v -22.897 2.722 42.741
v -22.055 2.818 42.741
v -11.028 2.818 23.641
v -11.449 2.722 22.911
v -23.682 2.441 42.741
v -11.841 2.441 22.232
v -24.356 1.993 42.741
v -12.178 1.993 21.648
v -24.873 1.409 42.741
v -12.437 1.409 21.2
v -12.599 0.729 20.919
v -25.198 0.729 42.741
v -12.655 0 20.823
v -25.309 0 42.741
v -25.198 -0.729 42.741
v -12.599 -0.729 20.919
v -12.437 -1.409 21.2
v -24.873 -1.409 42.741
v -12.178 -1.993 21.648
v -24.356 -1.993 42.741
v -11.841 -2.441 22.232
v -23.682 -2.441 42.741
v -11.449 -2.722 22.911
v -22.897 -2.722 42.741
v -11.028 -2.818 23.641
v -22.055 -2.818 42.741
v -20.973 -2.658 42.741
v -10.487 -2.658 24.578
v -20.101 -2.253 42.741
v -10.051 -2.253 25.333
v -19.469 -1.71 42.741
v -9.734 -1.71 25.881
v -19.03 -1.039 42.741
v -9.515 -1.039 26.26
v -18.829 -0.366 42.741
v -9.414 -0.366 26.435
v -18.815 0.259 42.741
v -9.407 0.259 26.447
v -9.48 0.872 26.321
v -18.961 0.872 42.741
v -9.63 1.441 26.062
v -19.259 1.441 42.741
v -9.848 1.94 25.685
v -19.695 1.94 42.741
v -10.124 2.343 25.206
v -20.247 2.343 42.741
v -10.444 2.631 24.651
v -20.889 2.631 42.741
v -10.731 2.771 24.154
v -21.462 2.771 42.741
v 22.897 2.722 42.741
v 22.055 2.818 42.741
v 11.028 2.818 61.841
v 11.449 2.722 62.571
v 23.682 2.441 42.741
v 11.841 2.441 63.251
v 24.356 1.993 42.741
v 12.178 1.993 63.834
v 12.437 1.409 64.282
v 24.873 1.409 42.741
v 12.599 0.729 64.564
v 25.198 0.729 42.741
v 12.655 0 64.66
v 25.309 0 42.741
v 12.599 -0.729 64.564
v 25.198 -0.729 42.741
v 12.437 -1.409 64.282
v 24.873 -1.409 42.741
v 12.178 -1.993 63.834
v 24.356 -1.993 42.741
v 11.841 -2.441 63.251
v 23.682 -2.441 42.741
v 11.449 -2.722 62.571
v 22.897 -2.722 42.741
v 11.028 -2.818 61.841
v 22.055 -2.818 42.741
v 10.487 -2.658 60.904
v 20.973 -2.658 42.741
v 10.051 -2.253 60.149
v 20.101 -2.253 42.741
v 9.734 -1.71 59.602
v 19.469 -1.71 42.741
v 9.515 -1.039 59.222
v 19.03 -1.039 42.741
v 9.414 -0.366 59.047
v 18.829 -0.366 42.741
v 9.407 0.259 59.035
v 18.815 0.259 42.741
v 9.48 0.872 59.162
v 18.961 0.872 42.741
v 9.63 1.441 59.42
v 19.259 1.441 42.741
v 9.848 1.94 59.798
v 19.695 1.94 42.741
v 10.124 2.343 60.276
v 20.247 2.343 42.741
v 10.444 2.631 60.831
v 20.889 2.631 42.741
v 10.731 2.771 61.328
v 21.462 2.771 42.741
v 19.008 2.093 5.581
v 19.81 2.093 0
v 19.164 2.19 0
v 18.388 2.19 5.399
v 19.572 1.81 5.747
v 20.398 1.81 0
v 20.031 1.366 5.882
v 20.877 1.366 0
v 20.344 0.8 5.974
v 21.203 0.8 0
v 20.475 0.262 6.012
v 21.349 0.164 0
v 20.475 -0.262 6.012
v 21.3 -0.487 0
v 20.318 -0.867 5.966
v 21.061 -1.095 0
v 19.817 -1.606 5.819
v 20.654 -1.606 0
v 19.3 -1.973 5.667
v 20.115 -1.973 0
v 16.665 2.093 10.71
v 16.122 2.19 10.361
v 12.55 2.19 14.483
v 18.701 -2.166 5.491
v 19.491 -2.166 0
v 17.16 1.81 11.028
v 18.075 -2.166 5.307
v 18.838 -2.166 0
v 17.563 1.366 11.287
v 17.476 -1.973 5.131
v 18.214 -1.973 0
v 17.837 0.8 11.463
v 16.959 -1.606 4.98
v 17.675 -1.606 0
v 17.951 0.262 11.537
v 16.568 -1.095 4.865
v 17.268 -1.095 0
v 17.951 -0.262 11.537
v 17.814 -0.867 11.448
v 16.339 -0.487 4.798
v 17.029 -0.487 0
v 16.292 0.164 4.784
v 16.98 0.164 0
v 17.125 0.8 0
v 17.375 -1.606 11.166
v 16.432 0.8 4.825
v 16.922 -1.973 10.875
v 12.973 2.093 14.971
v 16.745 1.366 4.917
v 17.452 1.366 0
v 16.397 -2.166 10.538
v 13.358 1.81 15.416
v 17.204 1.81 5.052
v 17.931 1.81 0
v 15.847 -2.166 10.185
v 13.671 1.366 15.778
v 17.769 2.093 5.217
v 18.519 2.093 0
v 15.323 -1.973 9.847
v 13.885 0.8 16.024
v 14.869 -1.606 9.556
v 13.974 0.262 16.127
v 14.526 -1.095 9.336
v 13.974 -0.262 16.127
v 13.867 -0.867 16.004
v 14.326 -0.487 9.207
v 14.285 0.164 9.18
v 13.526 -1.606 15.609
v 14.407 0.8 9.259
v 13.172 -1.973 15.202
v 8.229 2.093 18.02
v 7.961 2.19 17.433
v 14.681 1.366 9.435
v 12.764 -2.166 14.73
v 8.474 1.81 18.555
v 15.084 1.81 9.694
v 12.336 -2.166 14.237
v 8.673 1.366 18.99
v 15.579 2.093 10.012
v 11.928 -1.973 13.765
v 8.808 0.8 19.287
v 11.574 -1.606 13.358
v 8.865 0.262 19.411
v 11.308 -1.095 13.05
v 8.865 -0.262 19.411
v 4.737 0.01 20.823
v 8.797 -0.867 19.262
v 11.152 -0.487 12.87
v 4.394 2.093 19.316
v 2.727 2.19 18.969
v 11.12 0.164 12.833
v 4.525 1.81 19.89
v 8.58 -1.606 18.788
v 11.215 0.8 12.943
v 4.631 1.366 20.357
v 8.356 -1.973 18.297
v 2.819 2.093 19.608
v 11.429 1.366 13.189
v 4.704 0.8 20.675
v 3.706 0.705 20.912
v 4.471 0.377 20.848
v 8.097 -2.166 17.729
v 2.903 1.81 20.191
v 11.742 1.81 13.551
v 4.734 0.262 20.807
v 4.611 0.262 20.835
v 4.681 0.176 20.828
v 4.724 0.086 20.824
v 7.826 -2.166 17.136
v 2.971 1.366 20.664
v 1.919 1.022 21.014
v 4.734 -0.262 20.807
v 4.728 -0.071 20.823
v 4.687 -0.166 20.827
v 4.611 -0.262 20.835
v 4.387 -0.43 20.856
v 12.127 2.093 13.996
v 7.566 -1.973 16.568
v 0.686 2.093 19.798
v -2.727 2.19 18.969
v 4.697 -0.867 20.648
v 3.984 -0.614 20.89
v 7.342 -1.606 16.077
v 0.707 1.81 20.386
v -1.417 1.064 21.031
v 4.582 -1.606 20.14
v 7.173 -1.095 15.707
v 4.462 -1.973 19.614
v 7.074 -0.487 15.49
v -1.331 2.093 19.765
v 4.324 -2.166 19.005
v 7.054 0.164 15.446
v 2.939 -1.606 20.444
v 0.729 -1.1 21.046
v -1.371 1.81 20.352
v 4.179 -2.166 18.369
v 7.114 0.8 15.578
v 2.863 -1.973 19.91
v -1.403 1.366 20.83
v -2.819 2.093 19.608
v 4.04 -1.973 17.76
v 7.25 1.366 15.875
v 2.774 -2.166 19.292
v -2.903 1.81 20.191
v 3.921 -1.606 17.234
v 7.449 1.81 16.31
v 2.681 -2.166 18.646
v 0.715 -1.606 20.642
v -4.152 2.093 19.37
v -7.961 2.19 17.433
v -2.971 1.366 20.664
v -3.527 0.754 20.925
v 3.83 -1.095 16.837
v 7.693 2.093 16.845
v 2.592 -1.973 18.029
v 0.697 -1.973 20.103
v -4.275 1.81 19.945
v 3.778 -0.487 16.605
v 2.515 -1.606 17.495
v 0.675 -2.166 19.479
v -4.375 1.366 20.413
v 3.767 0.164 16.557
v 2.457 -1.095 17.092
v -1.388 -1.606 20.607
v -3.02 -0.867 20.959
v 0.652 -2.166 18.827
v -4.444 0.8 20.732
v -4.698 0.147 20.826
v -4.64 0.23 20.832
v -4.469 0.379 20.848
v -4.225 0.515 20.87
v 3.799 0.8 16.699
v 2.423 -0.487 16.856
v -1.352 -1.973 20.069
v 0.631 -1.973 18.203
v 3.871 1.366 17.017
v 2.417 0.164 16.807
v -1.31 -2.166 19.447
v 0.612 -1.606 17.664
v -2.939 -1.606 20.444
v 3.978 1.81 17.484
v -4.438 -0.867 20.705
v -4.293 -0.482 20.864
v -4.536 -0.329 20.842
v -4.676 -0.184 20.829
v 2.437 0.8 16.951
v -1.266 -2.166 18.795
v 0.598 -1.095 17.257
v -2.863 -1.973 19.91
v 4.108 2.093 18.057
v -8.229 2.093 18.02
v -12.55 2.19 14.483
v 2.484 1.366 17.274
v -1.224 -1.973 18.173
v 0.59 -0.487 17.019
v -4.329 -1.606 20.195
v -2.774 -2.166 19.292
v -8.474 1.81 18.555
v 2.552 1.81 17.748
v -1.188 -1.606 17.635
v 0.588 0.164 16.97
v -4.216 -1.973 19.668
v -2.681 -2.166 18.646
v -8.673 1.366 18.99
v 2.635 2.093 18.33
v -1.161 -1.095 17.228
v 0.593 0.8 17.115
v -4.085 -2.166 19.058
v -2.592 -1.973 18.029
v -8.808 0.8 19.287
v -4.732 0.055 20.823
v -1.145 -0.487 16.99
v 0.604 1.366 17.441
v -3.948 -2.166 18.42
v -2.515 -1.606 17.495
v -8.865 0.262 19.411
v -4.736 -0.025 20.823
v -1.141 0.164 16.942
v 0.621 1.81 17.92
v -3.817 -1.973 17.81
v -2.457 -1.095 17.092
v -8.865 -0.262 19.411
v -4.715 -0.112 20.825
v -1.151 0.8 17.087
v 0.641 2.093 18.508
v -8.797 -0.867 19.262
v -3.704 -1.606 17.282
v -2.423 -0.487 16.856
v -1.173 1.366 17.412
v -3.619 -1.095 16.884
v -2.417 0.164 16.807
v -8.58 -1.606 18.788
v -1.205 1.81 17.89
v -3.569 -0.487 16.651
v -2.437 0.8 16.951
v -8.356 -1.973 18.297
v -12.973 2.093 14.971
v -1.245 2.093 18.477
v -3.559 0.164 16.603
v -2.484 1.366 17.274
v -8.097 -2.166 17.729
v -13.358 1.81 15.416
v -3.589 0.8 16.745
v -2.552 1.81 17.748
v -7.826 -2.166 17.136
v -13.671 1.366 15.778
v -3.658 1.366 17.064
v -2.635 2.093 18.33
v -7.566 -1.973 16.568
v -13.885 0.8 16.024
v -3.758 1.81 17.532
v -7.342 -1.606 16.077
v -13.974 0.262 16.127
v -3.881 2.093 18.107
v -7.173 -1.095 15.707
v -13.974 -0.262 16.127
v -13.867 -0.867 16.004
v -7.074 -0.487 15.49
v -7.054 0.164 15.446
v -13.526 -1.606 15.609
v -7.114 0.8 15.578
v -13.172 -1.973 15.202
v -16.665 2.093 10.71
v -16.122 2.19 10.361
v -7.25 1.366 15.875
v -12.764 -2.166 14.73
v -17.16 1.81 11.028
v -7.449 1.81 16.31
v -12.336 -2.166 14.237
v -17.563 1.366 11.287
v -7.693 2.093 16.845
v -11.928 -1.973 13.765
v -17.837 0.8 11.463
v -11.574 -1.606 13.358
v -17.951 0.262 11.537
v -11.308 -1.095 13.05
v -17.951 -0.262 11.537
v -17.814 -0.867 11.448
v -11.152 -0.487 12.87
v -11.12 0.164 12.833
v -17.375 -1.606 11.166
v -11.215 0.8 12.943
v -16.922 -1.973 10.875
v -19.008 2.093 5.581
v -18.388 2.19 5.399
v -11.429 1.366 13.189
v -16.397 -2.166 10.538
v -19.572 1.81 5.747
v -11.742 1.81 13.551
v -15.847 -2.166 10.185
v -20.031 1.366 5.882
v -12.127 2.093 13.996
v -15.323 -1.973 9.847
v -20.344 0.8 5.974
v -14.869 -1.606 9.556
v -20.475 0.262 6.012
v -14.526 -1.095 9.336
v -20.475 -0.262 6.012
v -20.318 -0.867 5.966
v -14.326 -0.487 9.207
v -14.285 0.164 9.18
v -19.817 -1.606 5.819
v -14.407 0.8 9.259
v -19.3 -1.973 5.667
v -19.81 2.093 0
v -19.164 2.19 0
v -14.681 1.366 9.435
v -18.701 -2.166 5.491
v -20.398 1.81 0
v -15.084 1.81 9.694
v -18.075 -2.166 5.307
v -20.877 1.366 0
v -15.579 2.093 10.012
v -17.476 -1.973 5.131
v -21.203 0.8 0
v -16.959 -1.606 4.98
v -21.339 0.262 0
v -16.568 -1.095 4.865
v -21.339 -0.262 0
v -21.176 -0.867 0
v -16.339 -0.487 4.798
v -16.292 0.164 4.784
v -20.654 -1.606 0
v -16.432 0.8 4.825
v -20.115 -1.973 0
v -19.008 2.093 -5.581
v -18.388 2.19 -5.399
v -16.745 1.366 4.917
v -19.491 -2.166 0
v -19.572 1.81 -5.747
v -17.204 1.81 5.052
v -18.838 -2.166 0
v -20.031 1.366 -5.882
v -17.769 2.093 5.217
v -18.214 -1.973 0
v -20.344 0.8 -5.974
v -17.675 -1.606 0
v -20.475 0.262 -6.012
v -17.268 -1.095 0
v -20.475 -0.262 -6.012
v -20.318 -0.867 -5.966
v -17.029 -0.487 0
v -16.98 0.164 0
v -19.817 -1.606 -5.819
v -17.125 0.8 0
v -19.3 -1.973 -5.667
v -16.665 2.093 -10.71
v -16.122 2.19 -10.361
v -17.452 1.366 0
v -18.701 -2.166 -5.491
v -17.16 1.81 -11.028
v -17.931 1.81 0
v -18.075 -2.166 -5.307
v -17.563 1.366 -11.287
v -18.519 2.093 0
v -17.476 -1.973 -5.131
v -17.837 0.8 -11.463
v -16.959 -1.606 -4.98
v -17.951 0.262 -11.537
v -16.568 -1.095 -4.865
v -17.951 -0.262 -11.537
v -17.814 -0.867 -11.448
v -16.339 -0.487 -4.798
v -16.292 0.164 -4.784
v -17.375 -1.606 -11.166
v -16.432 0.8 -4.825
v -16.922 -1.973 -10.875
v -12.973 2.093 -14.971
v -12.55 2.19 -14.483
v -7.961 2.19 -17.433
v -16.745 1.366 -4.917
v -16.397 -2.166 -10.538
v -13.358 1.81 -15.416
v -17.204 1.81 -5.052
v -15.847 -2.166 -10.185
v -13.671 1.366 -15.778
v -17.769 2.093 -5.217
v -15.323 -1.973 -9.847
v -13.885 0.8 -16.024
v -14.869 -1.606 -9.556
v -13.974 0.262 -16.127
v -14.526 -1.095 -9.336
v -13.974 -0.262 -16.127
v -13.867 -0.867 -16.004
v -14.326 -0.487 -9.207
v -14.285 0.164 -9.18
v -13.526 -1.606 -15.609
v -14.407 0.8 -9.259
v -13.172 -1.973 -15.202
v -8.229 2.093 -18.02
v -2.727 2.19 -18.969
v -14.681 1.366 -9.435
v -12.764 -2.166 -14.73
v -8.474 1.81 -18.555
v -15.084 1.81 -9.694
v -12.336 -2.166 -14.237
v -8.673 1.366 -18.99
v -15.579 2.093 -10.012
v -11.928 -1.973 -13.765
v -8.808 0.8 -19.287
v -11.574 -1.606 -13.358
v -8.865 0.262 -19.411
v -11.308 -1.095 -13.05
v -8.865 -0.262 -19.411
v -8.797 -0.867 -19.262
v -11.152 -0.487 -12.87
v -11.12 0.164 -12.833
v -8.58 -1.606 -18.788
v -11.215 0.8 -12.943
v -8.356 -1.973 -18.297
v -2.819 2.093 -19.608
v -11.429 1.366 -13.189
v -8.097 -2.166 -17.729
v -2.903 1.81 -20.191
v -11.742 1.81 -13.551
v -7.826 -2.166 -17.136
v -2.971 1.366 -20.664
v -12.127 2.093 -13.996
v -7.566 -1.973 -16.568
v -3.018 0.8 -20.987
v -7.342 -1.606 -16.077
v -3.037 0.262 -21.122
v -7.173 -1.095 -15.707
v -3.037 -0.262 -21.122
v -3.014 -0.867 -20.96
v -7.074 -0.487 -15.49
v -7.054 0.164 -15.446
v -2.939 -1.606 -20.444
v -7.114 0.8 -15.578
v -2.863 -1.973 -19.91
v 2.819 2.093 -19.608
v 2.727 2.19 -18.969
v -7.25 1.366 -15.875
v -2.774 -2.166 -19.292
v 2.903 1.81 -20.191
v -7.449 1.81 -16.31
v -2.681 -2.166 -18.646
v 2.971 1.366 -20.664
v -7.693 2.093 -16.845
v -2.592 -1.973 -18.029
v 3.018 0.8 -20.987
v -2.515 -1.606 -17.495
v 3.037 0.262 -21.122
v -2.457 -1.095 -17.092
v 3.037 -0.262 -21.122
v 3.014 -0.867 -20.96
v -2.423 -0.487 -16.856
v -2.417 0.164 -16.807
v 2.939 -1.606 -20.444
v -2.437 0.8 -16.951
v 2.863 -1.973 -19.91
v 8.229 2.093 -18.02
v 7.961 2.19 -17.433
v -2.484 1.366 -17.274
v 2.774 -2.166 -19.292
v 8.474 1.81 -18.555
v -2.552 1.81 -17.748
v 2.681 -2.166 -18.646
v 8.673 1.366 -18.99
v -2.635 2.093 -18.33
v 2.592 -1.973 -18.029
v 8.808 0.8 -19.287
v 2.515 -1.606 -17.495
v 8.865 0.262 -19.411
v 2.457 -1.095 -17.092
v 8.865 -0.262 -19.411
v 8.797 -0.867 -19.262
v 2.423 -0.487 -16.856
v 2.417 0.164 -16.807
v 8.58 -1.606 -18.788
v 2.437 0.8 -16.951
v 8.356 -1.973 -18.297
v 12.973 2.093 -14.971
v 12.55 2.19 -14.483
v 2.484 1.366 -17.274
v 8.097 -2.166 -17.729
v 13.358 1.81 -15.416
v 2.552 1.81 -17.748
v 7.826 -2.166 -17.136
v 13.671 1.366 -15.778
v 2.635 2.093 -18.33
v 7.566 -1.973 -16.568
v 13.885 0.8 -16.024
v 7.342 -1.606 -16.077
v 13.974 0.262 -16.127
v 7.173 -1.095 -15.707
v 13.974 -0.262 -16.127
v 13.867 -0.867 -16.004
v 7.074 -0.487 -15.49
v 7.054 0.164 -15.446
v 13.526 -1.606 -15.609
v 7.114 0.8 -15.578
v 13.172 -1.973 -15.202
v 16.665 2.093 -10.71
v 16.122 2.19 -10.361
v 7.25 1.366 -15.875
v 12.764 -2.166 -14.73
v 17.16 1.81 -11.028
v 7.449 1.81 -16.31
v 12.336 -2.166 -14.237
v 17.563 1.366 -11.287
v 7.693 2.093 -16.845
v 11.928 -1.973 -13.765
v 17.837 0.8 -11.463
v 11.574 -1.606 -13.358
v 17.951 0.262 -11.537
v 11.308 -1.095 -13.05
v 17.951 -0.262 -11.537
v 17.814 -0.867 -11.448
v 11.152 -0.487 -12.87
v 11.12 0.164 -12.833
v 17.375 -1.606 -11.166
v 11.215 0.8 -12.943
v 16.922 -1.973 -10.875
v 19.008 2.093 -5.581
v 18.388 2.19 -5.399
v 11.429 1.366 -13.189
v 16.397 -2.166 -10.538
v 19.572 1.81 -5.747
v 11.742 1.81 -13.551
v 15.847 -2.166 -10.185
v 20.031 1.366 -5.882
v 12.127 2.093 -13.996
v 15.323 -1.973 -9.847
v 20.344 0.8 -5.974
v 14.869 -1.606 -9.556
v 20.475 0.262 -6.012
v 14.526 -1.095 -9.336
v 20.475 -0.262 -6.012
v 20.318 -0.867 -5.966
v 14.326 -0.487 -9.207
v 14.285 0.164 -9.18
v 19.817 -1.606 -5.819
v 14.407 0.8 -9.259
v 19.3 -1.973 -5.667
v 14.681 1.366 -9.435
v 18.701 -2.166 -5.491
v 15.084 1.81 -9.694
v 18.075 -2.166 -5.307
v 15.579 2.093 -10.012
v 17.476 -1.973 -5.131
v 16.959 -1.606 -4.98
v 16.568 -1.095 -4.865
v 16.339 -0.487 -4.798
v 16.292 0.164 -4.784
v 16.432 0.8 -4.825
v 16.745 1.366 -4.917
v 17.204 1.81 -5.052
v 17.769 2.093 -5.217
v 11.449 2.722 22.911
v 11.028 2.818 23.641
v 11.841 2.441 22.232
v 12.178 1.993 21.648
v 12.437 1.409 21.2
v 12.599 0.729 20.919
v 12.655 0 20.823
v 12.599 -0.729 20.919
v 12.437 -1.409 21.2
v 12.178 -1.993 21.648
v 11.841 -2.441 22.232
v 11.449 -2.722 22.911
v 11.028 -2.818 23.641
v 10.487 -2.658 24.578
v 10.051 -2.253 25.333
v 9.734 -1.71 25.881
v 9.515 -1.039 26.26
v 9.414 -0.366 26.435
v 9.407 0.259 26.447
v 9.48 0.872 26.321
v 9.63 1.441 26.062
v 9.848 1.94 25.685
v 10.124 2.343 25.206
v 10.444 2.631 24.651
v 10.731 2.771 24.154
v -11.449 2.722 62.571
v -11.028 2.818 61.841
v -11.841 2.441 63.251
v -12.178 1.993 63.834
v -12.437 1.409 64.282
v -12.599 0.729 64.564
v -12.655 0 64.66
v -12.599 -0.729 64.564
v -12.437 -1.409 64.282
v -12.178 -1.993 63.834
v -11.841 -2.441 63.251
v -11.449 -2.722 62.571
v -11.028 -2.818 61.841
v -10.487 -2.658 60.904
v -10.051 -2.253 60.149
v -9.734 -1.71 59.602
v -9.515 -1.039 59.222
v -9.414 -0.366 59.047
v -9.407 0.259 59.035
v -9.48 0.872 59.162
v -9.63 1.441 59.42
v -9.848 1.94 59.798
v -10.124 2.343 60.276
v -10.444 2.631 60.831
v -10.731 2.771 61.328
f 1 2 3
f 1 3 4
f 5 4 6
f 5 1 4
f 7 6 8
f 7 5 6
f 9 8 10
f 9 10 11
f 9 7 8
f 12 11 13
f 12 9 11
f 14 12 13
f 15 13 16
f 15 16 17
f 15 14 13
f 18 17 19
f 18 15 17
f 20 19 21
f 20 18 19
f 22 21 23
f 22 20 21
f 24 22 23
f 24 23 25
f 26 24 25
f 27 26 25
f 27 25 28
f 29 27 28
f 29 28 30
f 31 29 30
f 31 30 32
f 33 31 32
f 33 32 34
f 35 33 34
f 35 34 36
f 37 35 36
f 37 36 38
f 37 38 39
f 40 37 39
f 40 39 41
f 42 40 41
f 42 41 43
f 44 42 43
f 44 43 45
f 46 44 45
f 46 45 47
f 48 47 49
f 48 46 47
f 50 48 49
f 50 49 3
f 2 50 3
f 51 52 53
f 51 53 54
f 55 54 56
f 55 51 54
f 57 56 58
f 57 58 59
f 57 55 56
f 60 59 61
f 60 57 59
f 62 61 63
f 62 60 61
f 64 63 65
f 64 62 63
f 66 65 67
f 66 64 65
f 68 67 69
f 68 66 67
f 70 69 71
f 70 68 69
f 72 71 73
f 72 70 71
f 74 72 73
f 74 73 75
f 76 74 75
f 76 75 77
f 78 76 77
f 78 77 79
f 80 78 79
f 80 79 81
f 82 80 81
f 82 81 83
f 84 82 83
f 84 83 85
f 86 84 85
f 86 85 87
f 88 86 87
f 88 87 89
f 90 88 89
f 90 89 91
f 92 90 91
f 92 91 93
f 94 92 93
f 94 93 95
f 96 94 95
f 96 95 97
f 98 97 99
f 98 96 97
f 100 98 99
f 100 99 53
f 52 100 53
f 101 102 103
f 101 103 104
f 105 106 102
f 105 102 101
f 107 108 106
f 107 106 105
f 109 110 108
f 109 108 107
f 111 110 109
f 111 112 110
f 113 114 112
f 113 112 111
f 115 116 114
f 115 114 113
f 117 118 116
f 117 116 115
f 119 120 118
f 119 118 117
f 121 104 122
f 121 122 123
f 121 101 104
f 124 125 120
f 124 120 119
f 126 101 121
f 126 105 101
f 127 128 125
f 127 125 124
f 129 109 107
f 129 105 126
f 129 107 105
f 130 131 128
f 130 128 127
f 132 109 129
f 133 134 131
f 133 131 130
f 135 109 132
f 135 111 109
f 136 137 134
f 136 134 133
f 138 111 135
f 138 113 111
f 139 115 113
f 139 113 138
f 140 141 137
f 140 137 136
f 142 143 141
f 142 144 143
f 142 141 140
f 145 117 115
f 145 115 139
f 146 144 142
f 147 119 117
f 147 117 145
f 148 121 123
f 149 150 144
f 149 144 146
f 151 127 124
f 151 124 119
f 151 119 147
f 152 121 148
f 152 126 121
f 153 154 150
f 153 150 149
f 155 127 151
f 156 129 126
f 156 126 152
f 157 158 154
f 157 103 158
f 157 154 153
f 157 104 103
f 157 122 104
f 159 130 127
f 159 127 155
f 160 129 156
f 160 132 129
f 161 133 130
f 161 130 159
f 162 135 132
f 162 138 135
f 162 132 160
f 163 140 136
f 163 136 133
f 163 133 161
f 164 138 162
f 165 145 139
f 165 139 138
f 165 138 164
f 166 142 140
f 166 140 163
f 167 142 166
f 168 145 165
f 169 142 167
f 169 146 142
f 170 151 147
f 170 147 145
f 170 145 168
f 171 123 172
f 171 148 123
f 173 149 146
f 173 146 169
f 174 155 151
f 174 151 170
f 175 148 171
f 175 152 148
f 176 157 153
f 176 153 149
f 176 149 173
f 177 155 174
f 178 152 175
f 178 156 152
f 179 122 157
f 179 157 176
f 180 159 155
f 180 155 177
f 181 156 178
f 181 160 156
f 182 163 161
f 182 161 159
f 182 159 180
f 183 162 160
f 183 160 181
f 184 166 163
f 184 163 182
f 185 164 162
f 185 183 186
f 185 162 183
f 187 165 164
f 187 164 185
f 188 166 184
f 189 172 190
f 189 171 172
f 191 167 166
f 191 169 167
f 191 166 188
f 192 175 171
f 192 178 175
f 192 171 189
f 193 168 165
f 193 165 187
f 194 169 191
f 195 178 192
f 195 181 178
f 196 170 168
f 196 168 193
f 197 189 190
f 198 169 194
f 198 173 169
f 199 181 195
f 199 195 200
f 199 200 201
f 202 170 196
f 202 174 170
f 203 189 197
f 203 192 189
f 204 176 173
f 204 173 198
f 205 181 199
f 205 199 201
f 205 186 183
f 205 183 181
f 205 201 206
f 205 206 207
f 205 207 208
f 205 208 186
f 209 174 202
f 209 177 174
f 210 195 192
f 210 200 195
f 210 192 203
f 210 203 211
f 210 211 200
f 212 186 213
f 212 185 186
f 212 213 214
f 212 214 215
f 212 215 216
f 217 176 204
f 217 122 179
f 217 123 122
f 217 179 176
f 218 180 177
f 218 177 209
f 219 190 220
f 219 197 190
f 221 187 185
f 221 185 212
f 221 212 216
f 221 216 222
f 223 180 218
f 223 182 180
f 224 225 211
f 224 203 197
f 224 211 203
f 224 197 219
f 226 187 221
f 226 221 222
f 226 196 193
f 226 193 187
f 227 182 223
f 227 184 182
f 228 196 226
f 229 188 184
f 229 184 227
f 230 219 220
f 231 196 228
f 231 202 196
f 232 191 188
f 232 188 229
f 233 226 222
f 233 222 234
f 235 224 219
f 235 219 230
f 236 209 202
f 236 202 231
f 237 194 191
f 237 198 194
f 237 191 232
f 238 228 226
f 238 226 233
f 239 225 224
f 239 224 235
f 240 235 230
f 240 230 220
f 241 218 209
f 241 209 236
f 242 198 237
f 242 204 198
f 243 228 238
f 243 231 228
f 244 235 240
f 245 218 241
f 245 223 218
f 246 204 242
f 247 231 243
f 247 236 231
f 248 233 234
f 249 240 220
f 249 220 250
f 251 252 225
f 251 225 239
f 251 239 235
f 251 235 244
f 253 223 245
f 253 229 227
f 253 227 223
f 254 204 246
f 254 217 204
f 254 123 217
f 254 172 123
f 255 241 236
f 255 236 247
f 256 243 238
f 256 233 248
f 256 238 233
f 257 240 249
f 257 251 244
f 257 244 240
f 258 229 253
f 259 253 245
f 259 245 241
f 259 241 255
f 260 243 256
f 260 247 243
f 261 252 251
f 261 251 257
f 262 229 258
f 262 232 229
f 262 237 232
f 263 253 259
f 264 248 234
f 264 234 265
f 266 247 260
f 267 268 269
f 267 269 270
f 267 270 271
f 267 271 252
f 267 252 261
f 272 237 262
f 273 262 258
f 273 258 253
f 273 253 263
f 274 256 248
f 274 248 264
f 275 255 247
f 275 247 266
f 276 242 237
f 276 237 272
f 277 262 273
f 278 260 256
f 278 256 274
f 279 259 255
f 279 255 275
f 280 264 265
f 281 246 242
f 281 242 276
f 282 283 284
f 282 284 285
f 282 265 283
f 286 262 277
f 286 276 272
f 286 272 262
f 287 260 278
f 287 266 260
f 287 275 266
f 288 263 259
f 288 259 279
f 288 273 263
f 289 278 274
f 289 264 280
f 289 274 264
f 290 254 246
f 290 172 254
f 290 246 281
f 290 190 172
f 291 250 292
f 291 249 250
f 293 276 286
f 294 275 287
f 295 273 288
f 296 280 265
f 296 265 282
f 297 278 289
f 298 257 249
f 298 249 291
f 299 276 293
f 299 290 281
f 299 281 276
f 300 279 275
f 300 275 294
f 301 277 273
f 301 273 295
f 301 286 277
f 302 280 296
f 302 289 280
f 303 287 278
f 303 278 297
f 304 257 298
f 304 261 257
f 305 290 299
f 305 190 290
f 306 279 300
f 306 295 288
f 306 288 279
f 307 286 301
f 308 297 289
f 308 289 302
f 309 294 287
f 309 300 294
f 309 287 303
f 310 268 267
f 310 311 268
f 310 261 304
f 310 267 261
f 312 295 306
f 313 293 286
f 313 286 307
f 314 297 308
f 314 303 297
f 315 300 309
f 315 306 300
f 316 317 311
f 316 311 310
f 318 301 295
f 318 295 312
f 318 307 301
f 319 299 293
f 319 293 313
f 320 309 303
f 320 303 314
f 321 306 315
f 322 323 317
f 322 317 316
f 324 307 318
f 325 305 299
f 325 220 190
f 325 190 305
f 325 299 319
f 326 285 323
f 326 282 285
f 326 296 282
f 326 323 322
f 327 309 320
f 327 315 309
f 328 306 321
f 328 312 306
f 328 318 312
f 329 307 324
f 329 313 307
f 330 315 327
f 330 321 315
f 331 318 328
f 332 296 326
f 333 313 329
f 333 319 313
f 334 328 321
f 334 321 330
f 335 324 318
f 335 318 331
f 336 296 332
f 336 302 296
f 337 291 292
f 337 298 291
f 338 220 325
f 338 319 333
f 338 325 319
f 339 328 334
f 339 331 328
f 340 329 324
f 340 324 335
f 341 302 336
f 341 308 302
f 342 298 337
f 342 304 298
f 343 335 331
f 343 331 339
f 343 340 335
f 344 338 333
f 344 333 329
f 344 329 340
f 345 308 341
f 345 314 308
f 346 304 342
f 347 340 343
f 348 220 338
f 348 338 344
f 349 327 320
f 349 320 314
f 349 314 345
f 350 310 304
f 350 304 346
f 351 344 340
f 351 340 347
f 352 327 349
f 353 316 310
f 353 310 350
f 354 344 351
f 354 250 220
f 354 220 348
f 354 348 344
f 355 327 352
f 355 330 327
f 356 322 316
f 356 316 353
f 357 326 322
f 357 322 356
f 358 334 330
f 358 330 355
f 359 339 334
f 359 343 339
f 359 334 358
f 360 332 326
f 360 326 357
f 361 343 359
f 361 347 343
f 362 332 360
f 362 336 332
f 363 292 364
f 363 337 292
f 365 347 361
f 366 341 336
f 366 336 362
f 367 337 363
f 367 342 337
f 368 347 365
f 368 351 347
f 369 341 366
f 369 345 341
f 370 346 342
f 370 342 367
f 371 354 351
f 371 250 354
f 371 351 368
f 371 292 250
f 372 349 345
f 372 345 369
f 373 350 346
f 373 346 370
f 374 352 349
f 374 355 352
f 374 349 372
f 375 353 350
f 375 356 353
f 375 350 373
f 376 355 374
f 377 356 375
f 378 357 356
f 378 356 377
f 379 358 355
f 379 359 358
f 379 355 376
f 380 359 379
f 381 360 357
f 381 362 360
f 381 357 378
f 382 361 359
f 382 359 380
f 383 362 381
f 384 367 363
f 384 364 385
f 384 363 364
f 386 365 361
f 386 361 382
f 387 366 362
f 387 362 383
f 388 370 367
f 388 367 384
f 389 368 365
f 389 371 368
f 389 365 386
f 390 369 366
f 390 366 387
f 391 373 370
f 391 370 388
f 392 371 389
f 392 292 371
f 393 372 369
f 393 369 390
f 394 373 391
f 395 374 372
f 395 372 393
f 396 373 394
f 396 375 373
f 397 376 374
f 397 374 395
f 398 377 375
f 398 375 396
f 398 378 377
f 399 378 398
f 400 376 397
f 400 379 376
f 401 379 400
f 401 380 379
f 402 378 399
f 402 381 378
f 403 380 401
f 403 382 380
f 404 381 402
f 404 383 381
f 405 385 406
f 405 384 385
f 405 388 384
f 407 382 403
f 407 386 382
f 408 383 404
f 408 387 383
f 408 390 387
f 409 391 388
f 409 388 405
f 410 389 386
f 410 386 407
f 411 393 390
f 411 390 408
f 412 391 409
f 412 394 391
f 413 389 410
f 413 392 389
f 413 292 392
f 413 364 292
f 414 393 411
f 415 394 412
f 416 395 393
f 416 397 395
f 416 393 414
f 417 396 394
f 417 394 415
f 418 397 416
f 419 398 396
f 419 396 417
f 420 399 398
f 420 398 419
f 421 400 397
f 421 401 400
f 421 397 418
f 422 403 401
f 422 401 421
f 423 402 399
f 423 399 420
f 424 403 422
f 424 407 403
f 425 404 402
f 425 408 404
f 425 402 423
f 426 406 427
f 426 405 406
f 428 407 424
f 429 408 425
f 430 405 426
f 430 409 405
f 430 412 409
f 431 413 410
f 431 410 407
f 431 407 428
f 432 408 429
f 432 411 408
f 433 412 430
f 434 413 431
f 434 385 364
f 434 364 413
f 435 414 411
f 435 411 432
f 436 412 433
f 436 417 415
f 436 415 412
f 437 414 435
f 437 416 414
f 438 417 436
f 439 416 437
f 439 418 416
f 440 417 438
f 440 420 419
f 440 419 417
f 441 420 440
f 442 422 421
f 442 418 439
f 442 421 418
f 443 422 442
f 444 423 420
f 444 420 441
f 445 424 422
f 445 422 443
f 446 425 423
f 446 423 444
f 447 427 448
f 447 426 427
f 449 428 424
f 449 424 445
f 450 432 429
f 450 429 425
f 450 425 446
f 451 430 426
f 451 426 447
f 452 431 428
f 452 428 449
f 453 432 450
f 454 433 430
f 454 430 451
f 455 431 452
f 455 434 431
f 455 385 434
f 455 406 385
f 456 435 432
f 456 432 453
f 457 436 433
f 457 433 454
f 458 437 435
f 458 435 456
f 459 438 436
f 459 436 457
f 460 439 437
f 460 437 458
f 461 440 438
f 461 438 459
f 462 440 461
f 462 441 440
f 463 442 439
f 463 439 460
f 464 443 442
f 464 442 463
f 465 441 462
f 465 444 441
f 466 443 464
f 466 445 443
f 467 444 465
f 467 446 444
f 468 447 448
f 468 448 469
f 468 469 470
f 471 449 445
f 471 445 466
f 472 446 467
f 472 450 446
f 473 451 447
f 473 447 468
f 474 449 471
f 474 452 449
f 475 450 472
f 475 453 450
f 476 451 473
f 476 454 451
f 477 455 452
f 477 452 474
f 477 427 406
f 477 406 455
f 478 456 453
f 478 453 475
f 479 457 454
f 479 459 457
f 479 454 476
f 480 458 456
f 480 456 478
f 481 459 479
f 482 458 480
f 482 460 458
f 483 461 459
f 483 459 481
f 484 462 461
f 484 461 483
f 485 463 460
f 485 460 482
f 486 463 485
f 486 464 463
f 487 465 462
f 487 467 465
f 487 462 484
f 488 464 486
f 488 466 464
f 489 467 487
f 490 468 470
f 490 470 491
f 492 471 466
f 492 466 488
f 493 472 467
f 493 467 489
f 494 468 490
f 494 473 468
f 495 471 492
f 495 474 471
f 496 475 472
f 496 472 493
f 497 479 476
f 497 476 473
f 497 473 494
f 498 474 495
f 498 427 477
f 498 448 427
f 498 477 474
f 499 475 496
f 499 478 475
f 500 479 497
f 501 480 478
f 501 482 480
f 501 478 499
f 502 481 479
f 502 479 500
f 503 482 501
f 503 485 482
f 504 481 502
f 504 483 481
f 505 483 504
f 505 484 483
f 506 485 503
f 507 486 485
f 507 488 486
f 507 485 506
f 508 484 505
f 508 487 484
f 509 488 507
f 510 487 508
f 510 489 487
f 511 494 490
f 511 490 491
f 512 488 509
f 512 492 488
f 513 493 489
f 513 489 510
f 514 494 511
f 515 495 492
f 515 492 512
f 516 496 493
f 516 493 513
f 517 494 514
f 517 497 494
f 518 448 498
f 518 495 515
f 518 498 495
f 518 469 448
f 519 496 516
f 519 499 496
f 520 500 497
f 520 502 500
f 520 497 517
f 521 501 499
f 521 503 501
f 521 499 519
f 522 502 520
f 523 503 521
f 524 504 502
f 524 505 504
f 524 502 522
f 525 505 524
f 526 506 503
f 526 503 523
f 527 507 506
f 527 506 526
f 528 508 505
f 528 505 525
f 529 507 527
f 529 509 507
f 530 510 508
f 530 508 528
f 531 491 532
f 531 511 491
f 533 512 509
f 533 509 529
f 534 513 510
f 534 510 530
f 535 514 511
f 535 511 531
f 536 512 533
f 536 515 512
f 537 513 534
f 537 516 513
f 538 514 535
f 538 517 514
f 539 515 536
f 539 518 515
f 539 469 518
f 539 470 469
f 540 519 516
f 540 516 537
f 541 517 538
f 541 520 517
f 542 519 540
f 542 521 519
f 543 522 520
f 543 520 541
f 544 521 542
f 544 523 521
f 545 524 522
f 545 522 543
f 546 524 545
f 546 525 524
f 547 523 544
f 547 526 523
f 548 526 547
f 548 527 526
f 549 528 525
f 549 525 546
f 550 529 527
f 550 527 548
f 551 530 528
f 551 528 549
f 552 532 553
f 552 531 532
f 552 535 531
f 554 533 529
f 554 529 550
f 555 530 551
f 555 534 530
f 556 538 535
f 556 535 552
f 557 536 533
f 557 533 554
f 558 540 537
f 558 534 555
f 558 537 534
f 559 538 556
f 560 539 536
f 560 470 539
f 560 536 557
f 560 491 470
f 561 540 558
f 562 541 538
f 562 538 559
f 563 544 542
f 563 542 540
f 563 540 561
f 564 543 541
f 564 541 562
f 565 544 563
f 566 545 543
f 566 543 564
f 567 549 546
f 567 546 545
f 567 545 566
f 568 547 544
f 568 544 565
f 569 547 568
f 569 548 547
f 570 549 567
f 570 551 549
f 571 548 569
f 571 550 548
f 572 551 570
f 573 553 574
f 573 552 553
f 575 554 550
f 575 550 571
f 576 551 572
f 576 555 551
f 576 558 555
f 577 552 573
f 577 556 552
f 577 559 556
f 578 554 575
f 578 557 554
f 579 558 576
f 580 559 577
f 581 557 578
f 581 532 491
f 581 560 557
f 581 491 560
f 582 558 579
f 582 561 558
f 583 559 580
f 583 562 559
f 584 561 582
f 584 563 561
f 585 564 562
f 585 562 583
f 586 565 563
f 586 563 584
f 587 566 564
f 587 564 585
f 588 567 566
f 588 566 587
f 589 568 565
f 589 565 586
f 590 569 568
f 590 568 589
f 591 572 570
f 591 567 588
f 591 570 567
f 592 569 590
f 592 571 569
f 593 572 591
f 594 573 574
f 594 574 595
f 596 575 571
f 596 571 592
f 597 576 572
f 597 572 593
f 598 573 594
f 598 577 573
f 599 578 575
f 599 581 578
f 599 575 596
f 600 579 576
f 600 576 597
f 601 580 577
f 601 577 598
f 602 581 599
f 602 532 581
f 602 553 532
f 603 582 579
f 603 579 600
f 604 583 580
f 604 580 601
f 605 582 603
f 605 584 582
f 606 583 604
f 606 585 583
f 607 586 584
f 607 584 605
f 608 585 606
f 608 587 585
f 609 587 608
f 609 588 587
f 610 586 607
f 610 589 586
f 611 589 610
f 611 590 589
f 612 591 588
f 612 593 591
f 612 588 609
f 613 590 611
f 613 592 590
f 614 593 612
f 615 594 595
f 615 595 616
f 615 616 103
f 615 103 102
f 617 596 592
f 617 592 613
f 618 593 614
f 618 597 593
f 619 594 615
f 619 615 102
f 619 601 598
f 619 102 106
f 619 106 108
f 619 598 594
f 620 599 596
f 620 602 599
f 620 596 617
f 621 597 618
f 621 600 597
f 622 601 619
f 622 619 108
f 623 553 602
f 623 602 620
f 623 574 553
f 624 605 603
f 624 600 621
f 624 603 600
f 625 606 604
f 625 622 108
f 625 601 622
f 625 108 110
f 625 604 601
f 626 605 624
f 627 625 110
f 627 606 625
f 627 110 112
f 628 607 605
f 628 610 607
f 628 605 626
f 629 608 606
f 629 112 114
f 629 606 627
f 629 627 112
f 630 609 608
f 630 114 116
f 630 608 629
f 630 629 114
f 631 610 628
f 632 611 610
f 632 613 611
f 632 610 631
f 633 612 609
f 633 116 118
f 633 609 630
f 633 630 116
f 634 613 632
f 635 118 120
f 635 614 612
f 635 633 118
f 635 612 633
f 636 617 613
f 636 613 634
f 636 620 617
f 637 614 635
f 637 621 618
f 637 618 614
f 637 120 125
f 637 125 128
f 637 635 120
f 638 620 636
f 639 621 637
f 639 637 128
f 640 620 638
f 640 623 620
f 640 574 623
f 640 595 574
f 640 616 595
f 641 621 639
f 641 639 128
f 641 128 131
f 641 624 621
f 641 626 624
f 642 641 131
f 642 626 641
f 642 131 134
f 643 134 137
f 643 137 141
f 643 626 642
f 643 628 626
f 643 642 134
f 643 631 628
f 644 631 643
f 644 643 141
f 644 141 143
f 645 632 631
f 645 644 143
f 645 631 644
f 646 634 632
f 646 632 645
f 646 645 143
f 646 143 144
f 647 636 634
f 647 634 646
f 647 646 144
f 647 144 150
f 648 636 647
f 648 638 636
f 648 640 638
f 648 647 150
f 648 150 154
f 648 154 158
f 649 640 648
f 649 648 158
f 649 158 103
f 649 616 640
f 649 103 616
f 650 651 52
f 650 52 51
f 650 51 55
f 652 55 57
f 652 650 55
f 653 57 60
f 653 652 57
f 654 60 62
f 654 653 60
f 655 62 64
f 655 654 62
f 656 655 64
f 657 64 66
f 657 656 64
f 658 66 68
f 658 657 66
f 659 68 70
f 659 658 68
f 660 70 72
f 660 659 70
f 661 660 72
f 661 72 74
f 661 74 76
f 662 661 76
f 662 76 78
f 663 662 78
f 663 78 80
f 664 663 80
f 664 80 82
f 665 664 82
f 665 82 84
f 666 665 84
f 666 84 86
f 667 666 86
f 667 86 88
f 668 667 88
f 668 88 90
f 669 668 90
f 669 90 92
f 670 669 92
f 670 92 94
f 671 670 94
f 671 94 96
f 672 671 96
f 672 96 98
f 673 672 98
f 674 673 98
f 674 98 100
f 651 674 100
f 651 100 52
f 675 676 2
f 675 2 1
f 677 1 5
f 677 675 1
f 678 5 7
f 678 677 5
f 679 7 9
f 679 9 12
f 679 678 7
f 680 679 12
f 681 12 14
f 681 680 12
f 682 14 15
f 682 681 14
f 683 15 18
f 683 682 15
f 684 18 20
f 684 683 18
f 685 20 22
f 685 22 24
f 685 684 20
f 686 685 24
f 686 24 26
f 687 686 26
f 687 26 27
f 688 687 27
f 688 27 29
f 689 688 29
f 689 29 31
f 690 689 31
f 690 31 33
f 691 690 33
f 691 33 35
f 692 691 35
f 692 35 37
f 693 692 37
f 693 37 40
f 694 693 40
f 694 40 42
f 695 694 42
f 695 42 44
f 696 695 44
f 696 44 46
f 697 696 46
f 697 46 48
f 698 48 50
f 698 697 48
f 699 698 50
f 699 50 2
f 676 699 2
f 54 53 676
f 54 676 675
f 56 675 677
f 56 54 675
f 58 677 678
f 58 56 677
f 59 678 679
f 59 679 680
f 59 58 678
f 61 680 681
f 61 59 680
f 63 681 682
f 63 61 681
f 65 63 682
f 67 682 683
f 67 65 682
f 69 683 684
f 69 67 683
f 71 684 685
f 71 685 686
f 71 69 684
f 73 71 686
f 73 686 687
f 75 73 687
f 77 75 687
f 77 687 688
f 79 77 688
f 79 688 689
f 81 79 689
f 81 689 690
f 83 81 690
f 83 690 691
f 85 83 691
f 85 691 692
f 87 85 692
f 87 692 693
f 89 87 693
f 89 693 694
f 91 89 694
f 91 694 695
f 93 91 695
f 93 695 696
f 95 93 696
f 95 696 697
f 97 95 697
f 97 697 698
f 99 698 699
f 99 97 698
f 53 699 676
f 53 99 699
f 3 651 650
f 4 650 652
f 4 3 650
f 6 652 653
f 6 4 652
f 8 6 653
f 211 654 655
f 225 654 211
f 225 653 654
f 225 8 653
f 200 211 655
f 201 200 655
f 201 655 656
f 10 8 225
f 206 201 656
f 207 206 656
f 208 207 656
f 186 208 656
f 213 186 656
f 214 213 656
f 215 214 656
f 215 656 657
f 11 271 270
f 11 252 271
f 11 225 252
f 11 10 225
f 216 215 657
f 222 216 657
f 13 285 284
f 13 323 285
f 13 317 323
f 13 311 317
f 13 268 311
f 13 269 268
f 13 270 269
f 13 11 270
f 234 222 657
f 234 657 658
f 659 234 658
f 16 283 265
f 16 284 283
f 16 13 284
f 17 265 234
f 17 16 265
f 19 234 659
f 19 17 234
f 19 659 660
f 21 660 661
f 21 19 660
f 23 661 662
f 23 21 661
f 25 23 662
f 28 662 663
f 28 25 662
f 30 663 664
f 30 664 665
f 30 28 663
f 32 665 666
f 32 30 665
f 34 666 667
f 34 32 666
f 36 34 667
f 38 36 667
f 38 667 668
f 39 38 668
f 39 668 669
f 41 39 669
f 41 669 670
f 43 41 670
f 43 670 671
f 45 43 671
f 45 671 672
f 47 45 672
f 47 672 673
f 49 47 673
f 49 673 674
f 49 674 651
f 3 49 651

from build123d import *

# Parameters (mm, degrees)
F1_R = 2.1902863251
F4_R = 2.8180913068


with BuildPart() as f2:
    # F2: sweep along a path in F0
    with BuildLine(Plane.XZ) as f2_path:
        CenterArc((0, 0), 19.2595042625, 0, 360)
    # F1 (on Right) → F2 (sweep)
    with BuildSketch(Plane.YZ):
        with Locations((0, 19.164359197)):
            Circle(F1_R)
    sweep(path=f2_path.line)

    # F5: sweep along a path in F3
    with BuildLine(Plane.XZ) as f5_path:
        Line((-8.6774716492, 27.7112331241), (-17.3549432985, 42.7410549019))
        Line((-17.3549432985, 42.7410549019), (-8.6774716492, 57.7708766796))
        Line((-8.6774716492, 57.7708766796), (8.6774716492, 57.7708766796))
        Line((8.6774716492, 57.7708766796), (17.3549432985, 42.7410549019))
        Line((17.3549432985, 42.7410549019), (8.6774716492, 27.7112331241))
        Line((8.6774716492, 27.7112331241), (-8.6774716492, 27.7112331241))
    # F4 (on Right) → F5 (sweep)
    with BuildSketch(Plane.YZ):
        with Locations((0, 61.8414543569)):
            Circle(F4_R)
    sweep(path=f5_path.line, transition=Transition.RIGHT)


solid = f2.part
